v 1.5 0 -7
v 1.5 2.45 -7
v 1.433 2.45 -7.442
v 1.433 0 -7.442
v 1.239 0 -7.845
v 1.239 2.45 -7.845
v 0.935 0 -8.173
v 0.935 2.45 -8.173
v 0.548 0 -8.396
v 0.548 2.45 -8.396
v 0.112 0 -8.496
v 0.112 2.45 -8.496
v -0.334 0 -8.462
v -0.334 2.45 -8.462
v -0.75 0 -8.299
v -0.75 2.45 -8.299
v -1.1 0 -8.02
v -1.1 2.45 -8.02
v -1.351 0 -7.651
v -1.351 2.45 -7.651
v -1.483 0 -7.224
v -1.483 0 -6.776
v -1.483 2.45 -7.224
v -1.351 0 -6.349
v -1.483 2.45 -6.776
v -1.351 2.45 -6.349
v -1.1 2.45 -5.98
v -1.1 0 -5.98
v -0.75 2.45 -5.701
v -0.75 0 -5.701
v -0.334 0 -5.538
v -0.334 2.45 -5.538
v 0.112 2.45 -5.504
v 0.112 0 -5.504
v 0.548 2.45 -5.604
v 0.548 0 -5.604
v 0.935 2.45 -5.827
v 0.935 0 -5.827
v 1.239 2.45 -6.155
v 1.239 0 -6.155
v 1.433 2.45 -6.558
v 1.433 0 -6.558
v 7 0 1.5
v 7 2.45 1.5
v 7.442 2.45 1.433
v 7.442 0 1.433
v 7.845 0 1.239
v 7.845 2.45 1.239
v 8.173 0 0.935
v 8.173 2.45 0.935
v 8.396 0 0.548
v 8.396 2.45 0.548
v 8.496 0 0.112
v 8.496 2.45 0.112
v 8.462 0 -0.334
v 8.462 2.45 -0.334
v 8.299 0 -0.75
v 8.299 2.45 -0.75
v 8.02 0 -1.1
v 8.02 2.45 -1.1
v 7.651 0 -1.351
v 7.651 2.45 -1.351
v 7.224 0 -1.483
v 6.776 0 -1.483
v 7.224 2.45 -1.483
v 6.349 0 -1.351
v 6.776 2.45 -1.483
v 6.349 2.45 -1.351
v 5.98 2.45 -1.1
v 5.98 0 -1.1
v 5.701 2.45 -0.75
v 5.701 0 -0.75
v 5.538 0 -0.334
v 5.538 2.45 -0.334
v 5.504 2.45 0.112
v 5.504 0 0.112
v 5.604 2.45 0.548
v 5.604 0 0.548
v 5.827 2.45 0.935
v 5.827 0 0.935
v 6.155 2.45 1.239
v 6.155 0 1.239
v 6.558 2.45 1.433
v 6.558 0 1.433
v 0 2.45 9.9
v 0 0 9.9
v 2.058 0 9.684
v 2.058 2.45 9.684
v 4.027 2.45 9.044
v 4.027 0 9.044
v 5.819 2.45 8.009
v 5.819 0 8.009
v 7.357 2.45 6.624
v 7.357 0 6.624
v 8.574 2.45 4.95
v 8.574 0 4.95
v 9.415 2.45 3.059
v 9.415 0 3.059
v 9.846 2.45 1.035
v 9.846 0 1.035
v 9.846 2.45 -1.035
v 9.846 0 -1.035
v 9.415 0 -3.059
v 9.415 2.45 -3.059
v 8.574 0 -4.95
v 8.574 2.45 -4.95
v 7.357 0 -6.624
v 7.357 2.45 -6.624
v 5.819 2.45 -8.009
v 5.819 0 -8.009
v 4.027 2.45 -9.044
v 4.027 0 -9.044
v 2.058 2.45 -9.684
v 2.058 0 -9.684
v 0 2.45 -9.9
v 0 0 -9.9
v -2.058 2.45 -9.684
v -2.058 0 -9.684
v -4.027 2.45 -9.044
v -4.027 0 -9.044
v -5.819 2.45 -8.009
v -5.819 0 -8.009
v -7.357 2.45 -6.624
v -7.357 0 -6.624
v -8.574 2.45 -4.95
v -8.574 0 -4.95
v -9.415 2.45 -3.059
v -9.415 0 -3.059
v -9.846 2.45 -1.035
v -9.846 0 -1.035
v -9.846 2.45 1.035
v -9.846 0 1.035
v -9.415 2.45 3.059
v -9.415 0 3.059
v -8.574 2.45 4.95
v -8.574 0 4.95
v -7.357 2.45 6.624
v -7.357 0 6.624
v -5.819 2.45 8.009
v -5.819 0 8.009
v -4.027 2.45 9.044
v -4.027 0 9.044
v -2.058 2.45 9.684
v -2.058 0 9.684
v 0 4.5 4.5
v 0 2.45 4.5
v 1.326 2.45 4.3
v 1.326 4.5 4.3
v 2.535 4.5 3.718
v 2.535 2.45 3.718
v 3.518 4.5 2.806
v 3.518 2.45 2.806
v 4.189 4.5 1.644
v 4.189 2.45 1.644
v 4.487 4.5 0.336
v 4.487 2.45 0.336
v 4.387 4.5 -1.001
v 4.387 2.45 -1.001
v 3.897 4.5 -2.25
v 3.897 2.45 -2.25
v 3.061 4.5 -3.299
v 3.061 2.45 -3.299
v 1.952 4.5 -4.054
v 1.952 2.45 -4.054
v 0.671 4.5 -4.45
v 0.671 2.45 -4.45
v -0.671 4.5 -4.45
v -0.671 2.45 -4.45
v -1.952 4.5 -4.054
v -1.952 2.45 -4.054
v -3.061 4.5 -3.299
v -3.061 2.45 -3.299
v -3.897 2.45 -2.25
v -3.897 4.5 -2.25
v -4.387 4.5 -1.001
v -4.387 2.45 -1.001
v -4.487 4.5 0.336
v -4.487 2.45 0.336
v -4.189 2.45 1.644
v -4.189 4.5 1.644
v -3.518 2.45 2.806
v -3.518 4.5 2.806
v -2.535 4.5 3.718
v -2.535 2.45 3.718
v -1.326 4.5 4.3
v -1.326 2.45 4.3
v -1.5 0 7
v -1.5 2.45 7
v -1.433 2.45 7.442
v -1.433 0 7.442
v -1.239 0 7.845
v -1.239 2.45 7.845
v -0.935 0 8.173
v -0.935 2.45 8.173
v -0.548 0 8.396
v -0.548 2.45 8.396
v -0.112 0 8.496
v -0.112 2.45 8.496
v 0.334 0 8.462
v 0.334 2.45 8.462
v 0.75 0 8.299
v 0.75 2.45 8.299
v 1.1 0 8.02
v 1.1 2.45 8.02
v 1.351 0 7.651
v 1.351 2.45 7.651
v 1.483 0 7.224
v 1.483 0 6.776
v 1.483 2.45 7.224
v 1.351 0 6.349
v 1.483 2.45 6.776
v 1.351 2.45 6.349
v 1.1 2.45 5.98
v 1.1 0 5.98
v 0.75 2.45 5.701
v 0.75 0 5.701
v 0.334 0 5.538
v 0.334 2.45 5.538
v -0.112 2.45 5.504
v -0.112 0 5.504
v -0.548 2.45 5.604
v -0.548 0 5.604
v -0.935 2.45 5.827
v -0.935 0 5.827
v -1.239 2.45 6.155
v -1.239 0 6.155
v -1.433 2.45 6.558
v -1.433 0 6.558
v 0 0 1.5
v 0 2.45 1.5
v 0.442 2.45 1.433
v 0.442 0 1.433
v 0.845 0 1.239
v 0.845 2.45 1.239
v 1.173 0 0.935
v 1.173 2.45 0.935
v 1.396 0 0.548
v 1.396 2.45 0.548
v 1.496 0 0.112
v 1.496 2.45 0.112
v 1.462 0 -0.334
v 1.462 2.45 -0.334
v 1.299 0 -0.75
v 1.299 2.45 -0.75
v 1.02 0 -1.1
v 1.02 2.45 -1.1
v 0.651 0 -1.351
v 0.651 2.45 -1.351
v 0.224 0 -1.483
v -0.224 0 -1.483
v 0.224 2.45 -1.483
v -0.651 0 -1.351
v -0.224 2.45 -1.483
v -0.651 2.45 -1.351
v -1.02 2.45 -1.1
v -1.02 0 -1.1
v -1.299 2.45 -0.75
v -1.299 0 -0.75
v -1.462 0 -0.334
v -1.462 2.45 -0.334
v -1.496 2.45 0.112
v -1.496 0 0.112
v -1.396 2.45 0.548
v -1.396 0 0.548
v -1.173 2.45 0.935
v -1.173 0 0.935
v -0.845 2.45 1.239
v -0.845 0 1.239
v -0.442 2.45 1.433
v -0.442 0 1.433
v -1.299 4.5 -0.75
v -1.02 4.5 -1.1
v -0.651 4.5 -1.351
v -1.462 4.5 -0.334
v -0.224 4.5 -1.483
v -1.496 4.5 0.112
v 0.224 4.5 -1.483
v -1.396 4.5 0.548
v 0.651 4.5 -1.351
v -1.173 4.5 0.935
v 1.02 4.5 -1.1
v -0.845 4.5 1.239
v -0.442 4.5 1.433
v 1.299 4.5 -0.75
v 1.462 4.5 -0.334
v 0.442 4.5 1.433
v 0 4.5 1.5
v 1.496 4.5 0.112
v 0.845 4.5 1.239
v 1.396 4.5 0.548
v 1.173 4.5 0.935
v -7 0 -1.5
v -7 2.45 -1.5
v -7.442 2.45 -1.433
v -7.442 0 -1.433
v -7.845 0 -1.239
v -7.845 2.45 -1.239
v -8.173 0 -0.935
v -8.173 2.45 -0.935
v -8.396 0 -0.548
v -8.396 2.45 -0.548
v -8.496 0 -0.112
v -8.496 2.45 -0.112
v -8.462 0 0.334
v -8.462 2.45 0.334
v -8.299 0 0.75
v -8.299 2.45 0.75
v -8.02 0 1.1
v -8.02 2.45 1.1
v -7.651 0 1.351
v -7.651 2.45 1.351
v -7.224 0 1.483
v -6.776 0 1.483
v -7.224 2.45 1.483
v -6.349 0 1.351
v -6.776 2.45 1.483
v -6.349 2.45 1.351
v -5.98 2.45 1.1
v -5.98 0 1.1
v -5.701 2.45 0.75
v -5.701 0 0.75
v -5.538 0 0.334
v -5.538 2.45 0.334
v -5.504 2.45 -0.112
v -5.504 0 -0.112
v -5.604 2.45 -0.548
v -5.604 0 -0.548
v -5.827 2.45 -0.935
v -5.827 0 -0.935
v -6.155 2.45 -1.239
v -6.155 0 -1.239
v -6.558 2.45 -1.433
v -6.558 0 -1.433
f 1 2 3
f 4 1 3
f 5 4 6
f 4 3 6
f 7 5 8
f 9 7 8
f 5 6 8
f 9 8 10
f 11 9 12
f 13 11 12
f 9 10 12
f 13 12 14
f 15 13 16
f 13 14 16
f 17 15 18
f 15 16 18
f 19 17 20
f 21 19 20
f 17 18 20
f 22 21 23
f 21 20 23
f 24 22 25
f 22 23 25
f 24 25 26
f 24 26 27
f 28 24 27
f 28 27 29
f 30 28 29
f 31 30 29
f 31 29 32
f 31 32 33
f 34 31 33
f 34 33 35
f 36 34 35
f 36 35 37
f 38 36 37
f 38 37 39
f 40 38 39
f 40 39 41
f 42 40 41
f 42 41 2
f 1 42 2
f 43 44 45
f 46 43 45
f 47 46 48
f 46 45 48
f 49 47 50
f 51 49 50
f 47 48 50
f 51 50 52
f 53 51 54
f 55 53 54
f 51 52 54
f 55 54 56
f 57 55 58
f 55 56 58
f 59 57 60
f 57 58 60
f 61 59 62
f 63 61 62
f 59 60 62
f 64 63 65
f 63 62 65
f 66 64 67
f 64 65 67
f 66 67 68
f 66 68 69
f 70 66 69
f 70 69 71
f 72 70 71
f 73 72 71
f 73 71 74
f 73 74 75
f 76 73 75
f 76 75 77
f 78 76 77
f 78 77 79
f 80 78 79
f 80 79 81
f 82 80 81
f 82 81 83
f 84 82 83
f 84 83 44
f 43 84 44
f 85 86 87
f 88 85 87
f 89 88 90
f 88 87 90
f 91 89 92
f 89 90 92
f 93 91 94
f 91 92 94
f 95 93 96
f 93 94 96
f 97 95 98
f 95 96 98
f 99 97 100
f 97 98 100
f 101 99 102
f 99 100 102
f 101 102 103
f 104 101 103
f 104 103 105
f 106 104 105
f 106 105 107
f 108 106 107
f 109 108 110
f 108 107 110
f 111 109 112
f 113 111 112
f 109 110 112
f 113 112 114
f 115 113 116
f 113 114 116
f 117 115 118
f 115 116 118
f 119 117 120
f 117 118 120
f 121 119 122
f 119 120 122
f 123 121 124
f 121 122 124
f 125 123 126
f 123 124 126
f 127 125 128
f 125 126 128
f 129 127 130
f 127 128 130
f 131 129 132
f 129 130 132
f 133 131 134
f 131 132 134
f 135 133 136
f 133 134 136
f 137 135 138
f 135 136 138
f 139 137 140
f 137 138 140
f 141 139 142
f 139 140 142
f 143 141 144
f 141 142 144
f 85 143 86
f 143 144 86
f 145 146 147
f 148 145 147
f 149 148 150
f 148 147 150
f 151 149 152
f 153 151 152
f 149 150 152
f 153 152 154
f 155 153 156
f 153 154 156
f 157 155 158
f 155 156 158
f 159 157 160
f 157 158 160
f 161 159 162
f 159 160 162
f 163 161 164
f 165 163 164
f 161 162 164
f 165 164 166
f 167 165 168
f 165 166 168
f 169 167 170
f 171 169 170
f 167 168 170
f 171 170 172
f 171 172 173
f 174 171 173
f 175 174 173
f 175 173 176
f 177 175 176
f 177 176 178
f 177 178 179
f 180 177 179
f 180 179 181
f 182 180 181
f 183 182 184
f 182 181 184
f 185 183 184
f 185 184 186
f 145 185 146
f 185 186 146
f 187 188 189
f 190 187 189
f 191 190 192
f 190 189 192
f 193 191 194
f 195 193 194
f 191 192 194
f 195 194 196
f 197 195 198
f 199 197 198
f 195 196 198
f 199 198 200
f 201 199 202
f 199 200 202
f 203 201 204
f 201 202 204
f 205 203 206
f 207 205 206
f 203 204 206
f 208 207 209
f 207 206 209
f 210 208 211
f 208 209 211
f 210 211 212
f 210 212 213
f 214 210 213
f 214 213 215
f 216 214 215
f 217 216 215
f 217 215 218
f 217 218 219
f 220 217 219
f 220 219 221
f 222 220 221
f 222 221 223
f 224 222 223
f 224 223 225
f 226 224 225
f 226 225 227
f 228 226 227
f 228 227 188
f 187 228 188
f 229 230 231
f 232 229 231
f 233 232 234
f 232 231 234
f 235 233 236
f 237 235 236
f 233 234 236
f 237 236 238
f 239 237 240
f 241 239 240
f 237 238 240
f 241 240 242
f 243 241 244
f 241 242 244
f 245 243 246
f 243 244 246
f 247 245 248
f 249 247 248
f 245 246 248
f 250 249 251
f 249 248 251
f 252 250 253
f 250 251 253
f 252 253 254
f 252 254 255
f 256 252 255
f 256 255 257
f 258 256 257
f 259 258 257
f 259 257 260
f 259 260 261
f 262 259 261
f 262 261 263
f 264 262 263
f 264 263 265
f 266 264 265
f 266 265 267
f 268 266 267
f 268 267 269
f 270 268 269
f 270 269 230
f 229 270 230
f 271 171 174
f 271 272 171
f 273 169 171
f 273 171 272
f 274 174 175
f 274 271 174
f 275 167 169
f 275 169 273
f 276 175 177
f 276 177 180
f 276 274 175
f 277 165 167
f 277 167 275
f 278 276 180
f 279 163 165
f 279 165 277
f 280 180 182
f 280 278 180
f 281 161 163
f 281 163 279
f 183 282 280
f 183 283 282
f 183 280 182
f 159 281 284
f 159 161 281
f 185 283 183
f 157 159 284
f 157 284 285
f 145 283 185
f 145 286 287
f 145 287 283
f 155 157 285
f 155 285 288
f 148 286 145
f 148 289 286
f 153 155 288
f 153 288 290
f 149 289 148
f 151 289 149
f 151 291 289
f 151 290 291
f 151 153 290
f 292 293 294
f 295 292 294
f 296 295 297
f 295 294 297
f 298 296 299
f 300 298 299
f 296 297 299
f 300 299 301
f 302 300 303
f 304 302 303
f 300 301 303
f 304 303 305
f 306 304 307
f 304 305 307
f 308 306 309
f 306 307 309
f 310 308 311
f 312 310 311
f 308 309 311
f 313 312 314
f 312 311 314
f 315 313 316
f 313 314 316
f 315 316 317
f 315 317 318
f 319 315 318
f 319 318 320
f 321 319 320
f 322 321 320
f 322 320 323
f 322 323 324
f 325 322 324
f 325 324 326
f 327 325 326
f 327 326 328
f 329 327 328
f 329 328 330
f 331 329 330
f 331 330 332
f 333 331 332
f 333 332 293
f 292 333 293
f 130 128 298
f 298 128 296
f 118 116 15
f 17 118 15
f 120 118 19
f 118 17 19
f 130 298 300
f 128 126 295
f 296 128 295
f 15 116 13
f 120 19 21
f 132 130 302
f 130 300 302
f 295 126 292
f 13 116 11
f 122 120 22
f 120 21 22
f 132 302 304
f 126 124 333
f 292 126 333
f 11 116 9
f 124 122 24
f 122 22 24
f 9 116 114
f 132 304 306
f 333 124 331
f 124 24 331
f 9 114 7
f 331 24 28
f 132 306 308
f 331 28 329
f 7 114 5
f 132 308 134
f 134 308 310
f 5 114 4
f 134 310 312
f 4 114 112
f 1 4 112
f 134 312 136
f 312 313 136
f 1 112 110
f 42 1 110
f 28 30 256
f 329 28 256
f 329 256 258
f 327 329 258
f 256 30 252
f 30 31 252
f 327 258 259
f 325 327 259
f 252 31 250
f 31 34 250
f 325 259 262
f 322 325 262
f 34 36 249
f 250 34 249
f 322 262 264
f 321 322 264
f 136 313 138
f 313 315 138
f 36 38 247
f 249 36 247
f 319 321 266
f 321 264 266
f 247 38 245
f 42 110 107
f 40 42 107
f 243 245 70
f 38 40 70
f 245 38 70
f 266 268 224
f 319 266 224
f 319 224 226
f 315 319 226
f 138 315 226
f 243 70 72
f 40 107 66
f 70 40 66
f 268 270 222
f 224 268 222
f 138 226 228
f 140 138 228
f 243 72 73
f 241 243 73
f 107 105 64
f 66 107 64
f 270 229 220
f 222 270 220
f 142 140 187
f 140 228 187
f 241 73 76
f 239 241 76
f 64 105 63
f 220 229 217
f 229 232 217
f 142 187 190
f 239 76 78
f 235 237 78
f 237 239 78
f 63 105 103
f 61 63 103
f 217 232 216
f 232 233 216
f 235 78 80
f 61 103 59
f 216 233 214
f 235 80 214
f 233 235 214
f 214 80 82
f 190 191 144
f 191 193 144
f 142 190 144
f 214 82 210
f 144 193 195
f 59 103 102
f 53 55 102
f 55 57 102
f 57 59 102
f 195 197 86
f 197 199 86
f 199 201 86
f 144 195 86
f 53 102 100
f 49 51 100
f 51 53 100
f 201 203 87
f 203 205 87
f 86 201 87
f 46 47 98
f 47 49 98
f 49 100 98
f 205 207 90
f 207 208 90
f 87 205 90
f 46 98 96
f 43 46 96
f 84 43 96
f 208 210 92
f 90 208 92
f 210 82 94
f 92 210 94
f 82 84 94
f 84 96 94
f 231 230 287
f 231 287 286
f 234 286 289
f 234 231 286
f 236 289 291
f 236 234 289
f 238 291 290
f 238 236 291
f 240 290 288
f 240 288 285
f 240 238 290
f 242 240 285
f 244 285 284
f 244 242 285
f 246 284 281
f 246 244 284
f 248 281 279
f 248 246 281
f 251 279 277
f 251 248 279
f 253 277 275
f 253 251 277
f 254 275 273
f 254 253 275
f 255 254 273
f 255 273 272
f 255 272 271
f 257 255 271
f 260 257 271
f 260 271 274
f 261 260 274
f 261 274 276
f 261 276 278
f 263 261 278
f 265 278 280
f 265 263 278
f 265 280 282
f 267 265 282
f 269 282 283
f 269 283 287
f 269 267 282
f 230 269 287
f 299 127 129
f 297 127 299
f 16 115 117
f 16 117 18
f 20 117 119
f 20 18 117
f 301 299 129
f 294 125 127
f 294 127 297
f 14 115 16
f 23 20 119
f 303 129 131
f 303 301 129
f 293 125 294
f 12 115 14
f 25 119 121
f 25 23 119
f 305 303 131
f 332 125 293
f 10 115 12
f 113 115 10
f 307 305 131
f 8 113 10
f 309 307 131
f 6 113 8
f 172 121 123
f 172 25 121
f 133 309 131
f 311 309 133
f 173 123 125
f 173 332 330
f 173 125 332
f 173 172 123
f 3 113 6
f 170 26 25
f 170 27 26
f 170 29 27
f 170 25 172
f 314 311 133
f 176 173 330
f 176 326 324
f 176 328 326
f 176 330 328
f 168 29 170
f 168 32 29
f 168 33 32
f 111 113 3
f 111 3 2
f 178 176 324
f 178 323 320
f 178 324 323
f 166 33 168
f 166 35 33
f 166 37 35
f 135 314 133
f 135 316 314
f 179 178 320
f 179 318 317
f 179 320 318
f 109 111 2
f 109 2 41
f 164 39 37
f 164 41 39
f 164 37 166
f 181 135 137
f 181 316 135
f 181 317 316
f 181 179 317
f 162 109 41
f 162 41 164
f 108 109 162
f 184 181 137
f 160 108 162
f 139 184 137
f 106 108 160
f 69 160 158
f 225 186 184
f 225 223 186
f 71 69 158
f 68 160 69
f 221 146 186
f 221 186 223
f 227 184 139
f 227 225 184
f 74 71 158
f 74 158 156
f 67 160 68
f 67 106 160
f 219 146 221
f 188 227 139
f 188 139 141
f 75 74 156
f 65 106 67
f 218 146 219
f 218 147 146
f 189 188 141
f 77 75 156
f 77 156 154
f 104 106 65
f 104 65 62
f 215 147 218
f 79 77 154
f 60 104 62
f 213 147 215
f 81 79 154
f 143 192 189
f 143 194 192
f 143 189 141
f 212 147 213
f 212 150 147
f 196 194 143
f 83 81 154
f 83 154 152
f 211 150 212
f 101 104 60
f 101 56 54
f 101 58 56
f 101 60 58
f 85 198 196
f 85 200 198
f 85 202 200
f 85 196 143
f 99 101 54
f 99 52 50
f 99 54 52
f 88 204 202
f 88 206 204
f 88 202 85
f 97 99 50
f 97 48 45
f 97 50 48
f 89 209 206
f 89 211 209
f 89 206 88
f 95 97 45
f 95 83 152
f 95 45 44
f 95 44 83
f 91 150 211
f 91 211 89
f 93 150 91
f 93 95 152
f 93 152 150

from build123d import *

# Parameters (mm, degrees)
SKETCH2_R           = 9.9
BOSS_EXTRUDE2_DEPTH = 2.45
SKETCH3_R           = 4.5
SKETCH3_R_2         = 1.5
BOSS_EXTRUDE3_DEPTH = 2.05
SKETCH5_R           = 1.5
CUT_EXTRUDE1_DEPTH  = 15.213461929
SKETCH6_R           = 1.5
CUT_EXTRUDE2_DEPTH  = 15.213461929
CIRPATTERN1_COUNT   = 4


with BuildPart() as part:
    # Sketch2 → Boss-Extrude2 (new body)
    with BuildSketch(Plane(origin=(0, 0, 0), x_dir=(1, 0, 0), z_dir=(0, 1, 0))):
        Circle(SKETCH2_R)
    extrude(amount=BOSS_EXTRUDE2_DEPTH)

    # Sketch3 → Boss-Extrude3 (add)
    with BuildSketch(Plane(origin=(0, 2.45, 0), x_dir=(1, 0, 0), z_dir=(0, 1, 0))):
        Circle(SKETCH3_R)
        Circle(SKETCH3_R_2, mode=Mode.SUBTRACT)
    extrude(amount=BOSS_EXTRUDE3_DEPTH)

    # Sketch5 → Cut-Extrude1 (cut, through all)
    with BuildSketch(Plane(origin=(0, 2.45, 0), x_dir=(1, 0, 0), z_dir=(0, 1, 0))):
        Circle(SKETCH5_R)
    extrude(amount=-CUT_EXTRUDE1_DEPTH, mode=Mode.SUBTRACT)

    # Sketch6 → Cut-Extrude2 (cut, through all)
    with BuildSketch(Plane(origin=(0, 2.45, 0), x_dir=(1, 0, 0), z_dir=(0, 1, 0))):
        with Locations((7, 0)):
            Circle(SKETCH6_R)
    cut_extrude2 = extrude(amount=-CUT_EXTRUDE2_DEPTH, mode=Mode.SUBTRACT)

    # CirPattern1: Cut-Extrude2 ×4 about axis
    cirpattern1_axis = Axis((0, 4.5, 0), (0, -1, 0))
    for i in range(1, CIRPATTERN1_COUNT):
        add(cut_extrude2.rotate(cirpattern1_axis, i * 360 / CIRPATTERN1_COUNT), mode=Mode.SUBTRACT)


solid = part.part
